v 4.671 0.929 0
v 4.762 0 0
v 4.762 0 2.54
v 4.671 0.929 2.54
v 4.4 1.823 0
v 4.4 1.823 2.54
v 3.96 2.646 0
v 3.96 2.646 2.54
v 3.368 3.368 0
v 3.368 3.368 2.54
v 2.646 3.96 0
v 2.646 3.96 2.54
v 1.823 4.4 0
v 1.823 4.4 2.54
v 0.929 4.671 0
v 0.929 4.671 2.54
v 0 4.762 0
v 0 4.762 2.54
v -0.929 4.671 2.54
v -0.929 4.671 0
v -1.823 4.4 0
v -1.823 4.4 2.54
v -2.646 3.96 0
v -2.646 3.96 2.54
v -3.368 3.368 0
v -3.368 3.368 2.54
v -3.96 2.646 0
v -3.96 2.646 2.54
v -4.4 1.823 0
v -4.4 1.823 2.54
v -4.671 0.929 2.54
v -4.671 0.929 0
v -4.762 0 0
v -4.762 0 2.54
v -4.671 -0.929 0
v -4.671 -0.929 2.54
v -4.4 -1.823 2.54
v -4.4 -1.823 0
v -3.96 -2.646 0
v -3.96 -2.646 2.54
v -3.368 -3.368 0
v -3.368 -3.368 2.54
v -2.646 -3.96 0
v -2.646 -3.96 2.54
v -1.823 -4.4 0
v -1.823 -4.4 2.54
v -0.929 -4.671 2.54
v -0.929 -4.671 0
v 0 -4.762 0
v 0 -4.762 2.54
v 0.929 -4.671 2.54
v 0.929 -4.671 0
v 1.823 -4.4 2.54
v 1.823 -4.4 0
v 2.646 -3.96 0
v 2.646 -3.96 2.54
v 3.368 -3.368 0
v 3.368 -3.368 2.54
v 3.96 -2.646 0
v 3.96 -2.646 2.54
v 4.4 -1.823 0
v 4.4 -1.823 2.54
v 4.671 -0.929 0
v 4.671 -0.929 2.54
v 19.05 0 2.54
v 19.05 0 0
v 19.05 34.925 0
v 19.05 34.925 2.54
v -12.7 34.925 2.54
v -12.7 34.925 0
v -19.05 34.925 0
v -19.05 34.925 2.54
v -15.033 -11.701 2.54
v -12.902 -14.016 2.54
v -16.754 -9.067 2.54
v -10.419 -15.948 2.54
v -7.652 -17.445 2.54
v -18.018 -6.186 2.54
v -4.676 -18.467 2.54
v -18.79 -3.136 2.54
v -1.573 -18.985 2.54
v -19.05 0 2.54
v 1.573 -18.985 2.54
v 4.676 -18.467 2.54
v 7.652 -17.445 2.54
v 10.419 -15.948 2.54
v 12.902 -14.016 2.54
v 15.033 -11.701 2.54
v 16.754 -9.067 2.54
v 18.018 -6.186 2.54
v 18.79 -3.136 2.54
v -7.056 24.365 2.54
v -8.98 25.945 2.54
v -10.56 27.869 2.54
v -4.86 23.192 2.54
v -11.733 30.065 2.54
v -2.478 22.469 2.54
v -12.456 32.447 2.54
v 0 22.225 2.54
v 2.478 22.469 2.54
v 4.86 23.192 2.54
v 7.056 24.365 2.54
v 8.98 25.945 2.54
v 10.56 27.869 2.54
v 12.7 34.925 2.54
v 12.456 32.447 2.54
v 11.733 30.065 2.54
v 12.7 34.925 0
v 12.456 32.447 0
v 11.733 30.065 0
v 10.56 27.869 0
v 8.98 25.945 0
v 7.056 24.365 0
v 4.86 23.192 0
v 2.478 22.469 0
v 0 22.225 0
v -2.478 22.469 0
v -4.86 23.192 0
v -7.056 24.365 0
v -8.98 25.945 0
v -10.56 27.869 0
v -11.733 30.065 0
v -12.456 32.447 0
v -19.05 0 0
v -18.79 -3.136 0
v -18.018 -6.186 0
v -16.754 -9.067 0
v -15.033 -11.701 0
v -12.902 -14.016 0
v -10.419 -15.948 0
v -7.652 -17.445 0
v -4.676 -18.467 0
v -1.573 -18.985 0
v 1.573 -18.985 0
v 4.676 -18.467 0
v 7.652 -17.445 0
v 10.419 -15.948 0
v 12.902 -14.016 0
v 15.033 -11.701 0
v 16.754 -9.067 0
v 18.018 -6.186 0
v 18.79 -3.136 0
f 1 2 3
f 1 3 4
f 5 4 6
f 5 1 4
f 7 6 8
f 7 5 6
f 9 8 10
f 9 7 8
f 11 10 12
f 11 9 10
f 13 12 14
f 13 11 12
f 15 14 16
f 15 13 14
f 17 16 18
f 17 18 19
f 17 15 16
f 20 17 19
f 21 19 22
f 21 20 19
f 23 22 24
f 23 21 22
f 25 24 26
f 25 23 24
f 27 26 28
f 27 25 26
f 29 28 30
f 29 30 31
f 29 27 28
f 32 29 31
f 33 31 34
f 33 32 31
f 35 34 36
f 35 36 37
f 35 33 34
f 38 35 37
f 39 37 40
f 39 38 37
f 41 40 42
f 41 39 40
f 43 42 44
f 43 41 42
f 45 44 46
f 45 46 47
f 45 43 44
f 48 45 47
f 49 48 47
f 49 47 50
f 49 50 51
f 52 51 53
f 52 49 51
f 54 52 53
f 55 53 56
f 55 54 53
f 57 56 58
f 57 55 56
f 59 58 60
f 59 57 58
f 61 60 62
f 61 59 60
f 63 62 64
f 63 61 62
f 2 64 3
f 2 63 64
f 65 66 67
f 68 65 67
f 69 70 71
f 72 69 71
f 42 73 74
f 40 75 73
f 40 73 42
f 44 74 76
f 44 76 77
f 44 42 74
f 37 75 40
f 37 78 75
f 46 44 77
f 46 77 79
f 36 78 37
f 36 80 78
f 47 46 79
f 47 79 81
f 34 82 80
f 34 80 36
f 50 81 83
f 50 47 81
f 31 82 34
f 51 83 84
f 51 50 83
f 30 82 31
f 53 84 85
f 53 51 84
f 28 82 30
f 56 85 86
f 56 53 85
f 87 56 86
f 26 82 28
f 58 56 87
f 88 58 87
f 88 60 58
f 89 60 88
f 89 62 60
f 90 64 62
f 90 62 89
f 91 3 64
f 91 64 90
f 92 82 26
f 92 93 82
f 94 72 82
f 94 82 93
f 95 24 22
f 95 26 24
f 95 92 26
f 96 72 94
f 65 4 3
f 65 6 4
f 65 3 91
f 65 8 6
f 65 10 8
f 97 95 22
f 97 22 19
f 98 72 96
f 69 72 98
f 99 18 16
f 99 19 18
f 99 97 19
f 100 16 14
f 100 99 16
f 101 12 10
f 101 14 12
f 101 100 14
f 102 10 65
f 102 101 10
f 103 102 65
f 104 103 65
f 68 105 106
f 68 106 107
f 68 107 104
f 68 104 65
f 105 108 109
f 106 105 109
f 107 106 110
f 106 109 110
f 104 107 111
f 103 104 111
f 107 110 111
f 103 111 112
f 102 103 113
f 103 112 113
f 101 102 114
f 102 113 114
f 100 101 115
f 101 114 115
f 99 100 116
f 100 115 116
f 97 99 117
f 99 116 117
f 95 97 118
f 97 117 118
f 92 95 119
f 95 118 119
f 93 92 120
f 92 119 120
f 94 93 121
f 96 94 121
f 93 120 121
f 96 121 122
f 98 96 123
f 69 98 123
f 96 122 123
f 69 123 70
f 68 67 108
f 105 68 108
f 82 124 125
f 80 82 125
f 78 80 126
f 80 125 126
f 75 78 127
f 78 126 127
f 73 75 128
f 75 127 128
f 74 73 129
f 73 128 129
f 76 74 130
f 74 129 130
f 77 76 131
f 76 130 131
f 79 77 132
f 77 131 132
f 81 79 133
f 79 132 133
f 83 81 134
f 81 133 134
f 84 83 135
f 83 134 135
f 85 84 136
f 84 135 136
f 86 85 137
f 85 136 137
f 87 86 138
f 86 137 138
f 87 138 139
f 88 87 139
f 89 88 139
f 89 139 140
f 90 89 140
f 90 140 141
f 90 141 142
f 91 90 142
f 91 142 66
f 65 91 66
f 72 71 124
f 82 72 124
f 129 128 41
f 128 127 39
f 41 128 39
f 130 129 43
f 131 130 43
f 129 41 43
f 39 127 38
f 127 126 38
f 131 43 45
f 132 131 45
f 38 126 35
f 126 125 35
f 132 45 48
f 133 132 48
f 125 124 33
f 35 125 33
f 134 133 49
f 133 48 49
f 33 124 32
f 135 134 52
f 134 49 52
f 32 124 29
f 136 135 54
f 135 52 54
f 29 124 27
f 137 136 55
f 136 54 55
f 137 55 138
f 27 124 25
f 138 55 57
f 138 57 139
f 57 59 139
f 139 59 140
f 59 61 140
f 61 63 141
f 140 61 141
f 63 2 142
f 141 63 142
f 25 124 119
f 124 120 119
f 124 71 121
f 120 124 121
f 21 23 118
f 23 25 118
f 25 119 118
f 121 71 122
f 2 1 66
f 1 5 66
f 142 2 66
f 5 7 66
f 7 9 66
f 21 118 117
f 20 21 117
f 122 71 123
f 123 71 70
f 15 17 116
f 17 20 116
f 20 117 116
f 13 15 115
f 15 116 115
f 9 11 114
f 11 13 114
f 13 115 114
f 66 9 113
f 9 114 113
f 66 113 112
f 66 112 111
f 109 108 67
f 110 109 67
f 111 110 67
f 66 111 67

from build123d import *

# Parameters (mm, degrees)
SKETCH1_R           = 4.7625
BOSS_EXTRUDE1_DEPTH = 2.54


with BuildPart() as part:
    # Sketch1 → Boss-Extrude1 (new body)
    with BuildSketch(Plane.XY):
        with BuildLine():
            Line((-19.05, 34.925), (-19.05, -3e-09))
            ThreePointArc((-19.05, -3e-09), (2e-09, -19.05), (19.05, 0))
            Line((19.05, 0), (19.05, 34.925))
            Line((19.05, 34.925), (12.7, 34.925))
            ThreePointArc((12.7, 34.925), (0, 22.225), (-12.7, 34.925))
            Line((-12.7, 34.925), (-19.05, 34.925))
        make_face()
        Circle(SKETCH1_R, mode=Mode.SUBTRACT)
    extrude(amount=BOSS_EXTRUDE1_DEPTH)


solid = part.part
